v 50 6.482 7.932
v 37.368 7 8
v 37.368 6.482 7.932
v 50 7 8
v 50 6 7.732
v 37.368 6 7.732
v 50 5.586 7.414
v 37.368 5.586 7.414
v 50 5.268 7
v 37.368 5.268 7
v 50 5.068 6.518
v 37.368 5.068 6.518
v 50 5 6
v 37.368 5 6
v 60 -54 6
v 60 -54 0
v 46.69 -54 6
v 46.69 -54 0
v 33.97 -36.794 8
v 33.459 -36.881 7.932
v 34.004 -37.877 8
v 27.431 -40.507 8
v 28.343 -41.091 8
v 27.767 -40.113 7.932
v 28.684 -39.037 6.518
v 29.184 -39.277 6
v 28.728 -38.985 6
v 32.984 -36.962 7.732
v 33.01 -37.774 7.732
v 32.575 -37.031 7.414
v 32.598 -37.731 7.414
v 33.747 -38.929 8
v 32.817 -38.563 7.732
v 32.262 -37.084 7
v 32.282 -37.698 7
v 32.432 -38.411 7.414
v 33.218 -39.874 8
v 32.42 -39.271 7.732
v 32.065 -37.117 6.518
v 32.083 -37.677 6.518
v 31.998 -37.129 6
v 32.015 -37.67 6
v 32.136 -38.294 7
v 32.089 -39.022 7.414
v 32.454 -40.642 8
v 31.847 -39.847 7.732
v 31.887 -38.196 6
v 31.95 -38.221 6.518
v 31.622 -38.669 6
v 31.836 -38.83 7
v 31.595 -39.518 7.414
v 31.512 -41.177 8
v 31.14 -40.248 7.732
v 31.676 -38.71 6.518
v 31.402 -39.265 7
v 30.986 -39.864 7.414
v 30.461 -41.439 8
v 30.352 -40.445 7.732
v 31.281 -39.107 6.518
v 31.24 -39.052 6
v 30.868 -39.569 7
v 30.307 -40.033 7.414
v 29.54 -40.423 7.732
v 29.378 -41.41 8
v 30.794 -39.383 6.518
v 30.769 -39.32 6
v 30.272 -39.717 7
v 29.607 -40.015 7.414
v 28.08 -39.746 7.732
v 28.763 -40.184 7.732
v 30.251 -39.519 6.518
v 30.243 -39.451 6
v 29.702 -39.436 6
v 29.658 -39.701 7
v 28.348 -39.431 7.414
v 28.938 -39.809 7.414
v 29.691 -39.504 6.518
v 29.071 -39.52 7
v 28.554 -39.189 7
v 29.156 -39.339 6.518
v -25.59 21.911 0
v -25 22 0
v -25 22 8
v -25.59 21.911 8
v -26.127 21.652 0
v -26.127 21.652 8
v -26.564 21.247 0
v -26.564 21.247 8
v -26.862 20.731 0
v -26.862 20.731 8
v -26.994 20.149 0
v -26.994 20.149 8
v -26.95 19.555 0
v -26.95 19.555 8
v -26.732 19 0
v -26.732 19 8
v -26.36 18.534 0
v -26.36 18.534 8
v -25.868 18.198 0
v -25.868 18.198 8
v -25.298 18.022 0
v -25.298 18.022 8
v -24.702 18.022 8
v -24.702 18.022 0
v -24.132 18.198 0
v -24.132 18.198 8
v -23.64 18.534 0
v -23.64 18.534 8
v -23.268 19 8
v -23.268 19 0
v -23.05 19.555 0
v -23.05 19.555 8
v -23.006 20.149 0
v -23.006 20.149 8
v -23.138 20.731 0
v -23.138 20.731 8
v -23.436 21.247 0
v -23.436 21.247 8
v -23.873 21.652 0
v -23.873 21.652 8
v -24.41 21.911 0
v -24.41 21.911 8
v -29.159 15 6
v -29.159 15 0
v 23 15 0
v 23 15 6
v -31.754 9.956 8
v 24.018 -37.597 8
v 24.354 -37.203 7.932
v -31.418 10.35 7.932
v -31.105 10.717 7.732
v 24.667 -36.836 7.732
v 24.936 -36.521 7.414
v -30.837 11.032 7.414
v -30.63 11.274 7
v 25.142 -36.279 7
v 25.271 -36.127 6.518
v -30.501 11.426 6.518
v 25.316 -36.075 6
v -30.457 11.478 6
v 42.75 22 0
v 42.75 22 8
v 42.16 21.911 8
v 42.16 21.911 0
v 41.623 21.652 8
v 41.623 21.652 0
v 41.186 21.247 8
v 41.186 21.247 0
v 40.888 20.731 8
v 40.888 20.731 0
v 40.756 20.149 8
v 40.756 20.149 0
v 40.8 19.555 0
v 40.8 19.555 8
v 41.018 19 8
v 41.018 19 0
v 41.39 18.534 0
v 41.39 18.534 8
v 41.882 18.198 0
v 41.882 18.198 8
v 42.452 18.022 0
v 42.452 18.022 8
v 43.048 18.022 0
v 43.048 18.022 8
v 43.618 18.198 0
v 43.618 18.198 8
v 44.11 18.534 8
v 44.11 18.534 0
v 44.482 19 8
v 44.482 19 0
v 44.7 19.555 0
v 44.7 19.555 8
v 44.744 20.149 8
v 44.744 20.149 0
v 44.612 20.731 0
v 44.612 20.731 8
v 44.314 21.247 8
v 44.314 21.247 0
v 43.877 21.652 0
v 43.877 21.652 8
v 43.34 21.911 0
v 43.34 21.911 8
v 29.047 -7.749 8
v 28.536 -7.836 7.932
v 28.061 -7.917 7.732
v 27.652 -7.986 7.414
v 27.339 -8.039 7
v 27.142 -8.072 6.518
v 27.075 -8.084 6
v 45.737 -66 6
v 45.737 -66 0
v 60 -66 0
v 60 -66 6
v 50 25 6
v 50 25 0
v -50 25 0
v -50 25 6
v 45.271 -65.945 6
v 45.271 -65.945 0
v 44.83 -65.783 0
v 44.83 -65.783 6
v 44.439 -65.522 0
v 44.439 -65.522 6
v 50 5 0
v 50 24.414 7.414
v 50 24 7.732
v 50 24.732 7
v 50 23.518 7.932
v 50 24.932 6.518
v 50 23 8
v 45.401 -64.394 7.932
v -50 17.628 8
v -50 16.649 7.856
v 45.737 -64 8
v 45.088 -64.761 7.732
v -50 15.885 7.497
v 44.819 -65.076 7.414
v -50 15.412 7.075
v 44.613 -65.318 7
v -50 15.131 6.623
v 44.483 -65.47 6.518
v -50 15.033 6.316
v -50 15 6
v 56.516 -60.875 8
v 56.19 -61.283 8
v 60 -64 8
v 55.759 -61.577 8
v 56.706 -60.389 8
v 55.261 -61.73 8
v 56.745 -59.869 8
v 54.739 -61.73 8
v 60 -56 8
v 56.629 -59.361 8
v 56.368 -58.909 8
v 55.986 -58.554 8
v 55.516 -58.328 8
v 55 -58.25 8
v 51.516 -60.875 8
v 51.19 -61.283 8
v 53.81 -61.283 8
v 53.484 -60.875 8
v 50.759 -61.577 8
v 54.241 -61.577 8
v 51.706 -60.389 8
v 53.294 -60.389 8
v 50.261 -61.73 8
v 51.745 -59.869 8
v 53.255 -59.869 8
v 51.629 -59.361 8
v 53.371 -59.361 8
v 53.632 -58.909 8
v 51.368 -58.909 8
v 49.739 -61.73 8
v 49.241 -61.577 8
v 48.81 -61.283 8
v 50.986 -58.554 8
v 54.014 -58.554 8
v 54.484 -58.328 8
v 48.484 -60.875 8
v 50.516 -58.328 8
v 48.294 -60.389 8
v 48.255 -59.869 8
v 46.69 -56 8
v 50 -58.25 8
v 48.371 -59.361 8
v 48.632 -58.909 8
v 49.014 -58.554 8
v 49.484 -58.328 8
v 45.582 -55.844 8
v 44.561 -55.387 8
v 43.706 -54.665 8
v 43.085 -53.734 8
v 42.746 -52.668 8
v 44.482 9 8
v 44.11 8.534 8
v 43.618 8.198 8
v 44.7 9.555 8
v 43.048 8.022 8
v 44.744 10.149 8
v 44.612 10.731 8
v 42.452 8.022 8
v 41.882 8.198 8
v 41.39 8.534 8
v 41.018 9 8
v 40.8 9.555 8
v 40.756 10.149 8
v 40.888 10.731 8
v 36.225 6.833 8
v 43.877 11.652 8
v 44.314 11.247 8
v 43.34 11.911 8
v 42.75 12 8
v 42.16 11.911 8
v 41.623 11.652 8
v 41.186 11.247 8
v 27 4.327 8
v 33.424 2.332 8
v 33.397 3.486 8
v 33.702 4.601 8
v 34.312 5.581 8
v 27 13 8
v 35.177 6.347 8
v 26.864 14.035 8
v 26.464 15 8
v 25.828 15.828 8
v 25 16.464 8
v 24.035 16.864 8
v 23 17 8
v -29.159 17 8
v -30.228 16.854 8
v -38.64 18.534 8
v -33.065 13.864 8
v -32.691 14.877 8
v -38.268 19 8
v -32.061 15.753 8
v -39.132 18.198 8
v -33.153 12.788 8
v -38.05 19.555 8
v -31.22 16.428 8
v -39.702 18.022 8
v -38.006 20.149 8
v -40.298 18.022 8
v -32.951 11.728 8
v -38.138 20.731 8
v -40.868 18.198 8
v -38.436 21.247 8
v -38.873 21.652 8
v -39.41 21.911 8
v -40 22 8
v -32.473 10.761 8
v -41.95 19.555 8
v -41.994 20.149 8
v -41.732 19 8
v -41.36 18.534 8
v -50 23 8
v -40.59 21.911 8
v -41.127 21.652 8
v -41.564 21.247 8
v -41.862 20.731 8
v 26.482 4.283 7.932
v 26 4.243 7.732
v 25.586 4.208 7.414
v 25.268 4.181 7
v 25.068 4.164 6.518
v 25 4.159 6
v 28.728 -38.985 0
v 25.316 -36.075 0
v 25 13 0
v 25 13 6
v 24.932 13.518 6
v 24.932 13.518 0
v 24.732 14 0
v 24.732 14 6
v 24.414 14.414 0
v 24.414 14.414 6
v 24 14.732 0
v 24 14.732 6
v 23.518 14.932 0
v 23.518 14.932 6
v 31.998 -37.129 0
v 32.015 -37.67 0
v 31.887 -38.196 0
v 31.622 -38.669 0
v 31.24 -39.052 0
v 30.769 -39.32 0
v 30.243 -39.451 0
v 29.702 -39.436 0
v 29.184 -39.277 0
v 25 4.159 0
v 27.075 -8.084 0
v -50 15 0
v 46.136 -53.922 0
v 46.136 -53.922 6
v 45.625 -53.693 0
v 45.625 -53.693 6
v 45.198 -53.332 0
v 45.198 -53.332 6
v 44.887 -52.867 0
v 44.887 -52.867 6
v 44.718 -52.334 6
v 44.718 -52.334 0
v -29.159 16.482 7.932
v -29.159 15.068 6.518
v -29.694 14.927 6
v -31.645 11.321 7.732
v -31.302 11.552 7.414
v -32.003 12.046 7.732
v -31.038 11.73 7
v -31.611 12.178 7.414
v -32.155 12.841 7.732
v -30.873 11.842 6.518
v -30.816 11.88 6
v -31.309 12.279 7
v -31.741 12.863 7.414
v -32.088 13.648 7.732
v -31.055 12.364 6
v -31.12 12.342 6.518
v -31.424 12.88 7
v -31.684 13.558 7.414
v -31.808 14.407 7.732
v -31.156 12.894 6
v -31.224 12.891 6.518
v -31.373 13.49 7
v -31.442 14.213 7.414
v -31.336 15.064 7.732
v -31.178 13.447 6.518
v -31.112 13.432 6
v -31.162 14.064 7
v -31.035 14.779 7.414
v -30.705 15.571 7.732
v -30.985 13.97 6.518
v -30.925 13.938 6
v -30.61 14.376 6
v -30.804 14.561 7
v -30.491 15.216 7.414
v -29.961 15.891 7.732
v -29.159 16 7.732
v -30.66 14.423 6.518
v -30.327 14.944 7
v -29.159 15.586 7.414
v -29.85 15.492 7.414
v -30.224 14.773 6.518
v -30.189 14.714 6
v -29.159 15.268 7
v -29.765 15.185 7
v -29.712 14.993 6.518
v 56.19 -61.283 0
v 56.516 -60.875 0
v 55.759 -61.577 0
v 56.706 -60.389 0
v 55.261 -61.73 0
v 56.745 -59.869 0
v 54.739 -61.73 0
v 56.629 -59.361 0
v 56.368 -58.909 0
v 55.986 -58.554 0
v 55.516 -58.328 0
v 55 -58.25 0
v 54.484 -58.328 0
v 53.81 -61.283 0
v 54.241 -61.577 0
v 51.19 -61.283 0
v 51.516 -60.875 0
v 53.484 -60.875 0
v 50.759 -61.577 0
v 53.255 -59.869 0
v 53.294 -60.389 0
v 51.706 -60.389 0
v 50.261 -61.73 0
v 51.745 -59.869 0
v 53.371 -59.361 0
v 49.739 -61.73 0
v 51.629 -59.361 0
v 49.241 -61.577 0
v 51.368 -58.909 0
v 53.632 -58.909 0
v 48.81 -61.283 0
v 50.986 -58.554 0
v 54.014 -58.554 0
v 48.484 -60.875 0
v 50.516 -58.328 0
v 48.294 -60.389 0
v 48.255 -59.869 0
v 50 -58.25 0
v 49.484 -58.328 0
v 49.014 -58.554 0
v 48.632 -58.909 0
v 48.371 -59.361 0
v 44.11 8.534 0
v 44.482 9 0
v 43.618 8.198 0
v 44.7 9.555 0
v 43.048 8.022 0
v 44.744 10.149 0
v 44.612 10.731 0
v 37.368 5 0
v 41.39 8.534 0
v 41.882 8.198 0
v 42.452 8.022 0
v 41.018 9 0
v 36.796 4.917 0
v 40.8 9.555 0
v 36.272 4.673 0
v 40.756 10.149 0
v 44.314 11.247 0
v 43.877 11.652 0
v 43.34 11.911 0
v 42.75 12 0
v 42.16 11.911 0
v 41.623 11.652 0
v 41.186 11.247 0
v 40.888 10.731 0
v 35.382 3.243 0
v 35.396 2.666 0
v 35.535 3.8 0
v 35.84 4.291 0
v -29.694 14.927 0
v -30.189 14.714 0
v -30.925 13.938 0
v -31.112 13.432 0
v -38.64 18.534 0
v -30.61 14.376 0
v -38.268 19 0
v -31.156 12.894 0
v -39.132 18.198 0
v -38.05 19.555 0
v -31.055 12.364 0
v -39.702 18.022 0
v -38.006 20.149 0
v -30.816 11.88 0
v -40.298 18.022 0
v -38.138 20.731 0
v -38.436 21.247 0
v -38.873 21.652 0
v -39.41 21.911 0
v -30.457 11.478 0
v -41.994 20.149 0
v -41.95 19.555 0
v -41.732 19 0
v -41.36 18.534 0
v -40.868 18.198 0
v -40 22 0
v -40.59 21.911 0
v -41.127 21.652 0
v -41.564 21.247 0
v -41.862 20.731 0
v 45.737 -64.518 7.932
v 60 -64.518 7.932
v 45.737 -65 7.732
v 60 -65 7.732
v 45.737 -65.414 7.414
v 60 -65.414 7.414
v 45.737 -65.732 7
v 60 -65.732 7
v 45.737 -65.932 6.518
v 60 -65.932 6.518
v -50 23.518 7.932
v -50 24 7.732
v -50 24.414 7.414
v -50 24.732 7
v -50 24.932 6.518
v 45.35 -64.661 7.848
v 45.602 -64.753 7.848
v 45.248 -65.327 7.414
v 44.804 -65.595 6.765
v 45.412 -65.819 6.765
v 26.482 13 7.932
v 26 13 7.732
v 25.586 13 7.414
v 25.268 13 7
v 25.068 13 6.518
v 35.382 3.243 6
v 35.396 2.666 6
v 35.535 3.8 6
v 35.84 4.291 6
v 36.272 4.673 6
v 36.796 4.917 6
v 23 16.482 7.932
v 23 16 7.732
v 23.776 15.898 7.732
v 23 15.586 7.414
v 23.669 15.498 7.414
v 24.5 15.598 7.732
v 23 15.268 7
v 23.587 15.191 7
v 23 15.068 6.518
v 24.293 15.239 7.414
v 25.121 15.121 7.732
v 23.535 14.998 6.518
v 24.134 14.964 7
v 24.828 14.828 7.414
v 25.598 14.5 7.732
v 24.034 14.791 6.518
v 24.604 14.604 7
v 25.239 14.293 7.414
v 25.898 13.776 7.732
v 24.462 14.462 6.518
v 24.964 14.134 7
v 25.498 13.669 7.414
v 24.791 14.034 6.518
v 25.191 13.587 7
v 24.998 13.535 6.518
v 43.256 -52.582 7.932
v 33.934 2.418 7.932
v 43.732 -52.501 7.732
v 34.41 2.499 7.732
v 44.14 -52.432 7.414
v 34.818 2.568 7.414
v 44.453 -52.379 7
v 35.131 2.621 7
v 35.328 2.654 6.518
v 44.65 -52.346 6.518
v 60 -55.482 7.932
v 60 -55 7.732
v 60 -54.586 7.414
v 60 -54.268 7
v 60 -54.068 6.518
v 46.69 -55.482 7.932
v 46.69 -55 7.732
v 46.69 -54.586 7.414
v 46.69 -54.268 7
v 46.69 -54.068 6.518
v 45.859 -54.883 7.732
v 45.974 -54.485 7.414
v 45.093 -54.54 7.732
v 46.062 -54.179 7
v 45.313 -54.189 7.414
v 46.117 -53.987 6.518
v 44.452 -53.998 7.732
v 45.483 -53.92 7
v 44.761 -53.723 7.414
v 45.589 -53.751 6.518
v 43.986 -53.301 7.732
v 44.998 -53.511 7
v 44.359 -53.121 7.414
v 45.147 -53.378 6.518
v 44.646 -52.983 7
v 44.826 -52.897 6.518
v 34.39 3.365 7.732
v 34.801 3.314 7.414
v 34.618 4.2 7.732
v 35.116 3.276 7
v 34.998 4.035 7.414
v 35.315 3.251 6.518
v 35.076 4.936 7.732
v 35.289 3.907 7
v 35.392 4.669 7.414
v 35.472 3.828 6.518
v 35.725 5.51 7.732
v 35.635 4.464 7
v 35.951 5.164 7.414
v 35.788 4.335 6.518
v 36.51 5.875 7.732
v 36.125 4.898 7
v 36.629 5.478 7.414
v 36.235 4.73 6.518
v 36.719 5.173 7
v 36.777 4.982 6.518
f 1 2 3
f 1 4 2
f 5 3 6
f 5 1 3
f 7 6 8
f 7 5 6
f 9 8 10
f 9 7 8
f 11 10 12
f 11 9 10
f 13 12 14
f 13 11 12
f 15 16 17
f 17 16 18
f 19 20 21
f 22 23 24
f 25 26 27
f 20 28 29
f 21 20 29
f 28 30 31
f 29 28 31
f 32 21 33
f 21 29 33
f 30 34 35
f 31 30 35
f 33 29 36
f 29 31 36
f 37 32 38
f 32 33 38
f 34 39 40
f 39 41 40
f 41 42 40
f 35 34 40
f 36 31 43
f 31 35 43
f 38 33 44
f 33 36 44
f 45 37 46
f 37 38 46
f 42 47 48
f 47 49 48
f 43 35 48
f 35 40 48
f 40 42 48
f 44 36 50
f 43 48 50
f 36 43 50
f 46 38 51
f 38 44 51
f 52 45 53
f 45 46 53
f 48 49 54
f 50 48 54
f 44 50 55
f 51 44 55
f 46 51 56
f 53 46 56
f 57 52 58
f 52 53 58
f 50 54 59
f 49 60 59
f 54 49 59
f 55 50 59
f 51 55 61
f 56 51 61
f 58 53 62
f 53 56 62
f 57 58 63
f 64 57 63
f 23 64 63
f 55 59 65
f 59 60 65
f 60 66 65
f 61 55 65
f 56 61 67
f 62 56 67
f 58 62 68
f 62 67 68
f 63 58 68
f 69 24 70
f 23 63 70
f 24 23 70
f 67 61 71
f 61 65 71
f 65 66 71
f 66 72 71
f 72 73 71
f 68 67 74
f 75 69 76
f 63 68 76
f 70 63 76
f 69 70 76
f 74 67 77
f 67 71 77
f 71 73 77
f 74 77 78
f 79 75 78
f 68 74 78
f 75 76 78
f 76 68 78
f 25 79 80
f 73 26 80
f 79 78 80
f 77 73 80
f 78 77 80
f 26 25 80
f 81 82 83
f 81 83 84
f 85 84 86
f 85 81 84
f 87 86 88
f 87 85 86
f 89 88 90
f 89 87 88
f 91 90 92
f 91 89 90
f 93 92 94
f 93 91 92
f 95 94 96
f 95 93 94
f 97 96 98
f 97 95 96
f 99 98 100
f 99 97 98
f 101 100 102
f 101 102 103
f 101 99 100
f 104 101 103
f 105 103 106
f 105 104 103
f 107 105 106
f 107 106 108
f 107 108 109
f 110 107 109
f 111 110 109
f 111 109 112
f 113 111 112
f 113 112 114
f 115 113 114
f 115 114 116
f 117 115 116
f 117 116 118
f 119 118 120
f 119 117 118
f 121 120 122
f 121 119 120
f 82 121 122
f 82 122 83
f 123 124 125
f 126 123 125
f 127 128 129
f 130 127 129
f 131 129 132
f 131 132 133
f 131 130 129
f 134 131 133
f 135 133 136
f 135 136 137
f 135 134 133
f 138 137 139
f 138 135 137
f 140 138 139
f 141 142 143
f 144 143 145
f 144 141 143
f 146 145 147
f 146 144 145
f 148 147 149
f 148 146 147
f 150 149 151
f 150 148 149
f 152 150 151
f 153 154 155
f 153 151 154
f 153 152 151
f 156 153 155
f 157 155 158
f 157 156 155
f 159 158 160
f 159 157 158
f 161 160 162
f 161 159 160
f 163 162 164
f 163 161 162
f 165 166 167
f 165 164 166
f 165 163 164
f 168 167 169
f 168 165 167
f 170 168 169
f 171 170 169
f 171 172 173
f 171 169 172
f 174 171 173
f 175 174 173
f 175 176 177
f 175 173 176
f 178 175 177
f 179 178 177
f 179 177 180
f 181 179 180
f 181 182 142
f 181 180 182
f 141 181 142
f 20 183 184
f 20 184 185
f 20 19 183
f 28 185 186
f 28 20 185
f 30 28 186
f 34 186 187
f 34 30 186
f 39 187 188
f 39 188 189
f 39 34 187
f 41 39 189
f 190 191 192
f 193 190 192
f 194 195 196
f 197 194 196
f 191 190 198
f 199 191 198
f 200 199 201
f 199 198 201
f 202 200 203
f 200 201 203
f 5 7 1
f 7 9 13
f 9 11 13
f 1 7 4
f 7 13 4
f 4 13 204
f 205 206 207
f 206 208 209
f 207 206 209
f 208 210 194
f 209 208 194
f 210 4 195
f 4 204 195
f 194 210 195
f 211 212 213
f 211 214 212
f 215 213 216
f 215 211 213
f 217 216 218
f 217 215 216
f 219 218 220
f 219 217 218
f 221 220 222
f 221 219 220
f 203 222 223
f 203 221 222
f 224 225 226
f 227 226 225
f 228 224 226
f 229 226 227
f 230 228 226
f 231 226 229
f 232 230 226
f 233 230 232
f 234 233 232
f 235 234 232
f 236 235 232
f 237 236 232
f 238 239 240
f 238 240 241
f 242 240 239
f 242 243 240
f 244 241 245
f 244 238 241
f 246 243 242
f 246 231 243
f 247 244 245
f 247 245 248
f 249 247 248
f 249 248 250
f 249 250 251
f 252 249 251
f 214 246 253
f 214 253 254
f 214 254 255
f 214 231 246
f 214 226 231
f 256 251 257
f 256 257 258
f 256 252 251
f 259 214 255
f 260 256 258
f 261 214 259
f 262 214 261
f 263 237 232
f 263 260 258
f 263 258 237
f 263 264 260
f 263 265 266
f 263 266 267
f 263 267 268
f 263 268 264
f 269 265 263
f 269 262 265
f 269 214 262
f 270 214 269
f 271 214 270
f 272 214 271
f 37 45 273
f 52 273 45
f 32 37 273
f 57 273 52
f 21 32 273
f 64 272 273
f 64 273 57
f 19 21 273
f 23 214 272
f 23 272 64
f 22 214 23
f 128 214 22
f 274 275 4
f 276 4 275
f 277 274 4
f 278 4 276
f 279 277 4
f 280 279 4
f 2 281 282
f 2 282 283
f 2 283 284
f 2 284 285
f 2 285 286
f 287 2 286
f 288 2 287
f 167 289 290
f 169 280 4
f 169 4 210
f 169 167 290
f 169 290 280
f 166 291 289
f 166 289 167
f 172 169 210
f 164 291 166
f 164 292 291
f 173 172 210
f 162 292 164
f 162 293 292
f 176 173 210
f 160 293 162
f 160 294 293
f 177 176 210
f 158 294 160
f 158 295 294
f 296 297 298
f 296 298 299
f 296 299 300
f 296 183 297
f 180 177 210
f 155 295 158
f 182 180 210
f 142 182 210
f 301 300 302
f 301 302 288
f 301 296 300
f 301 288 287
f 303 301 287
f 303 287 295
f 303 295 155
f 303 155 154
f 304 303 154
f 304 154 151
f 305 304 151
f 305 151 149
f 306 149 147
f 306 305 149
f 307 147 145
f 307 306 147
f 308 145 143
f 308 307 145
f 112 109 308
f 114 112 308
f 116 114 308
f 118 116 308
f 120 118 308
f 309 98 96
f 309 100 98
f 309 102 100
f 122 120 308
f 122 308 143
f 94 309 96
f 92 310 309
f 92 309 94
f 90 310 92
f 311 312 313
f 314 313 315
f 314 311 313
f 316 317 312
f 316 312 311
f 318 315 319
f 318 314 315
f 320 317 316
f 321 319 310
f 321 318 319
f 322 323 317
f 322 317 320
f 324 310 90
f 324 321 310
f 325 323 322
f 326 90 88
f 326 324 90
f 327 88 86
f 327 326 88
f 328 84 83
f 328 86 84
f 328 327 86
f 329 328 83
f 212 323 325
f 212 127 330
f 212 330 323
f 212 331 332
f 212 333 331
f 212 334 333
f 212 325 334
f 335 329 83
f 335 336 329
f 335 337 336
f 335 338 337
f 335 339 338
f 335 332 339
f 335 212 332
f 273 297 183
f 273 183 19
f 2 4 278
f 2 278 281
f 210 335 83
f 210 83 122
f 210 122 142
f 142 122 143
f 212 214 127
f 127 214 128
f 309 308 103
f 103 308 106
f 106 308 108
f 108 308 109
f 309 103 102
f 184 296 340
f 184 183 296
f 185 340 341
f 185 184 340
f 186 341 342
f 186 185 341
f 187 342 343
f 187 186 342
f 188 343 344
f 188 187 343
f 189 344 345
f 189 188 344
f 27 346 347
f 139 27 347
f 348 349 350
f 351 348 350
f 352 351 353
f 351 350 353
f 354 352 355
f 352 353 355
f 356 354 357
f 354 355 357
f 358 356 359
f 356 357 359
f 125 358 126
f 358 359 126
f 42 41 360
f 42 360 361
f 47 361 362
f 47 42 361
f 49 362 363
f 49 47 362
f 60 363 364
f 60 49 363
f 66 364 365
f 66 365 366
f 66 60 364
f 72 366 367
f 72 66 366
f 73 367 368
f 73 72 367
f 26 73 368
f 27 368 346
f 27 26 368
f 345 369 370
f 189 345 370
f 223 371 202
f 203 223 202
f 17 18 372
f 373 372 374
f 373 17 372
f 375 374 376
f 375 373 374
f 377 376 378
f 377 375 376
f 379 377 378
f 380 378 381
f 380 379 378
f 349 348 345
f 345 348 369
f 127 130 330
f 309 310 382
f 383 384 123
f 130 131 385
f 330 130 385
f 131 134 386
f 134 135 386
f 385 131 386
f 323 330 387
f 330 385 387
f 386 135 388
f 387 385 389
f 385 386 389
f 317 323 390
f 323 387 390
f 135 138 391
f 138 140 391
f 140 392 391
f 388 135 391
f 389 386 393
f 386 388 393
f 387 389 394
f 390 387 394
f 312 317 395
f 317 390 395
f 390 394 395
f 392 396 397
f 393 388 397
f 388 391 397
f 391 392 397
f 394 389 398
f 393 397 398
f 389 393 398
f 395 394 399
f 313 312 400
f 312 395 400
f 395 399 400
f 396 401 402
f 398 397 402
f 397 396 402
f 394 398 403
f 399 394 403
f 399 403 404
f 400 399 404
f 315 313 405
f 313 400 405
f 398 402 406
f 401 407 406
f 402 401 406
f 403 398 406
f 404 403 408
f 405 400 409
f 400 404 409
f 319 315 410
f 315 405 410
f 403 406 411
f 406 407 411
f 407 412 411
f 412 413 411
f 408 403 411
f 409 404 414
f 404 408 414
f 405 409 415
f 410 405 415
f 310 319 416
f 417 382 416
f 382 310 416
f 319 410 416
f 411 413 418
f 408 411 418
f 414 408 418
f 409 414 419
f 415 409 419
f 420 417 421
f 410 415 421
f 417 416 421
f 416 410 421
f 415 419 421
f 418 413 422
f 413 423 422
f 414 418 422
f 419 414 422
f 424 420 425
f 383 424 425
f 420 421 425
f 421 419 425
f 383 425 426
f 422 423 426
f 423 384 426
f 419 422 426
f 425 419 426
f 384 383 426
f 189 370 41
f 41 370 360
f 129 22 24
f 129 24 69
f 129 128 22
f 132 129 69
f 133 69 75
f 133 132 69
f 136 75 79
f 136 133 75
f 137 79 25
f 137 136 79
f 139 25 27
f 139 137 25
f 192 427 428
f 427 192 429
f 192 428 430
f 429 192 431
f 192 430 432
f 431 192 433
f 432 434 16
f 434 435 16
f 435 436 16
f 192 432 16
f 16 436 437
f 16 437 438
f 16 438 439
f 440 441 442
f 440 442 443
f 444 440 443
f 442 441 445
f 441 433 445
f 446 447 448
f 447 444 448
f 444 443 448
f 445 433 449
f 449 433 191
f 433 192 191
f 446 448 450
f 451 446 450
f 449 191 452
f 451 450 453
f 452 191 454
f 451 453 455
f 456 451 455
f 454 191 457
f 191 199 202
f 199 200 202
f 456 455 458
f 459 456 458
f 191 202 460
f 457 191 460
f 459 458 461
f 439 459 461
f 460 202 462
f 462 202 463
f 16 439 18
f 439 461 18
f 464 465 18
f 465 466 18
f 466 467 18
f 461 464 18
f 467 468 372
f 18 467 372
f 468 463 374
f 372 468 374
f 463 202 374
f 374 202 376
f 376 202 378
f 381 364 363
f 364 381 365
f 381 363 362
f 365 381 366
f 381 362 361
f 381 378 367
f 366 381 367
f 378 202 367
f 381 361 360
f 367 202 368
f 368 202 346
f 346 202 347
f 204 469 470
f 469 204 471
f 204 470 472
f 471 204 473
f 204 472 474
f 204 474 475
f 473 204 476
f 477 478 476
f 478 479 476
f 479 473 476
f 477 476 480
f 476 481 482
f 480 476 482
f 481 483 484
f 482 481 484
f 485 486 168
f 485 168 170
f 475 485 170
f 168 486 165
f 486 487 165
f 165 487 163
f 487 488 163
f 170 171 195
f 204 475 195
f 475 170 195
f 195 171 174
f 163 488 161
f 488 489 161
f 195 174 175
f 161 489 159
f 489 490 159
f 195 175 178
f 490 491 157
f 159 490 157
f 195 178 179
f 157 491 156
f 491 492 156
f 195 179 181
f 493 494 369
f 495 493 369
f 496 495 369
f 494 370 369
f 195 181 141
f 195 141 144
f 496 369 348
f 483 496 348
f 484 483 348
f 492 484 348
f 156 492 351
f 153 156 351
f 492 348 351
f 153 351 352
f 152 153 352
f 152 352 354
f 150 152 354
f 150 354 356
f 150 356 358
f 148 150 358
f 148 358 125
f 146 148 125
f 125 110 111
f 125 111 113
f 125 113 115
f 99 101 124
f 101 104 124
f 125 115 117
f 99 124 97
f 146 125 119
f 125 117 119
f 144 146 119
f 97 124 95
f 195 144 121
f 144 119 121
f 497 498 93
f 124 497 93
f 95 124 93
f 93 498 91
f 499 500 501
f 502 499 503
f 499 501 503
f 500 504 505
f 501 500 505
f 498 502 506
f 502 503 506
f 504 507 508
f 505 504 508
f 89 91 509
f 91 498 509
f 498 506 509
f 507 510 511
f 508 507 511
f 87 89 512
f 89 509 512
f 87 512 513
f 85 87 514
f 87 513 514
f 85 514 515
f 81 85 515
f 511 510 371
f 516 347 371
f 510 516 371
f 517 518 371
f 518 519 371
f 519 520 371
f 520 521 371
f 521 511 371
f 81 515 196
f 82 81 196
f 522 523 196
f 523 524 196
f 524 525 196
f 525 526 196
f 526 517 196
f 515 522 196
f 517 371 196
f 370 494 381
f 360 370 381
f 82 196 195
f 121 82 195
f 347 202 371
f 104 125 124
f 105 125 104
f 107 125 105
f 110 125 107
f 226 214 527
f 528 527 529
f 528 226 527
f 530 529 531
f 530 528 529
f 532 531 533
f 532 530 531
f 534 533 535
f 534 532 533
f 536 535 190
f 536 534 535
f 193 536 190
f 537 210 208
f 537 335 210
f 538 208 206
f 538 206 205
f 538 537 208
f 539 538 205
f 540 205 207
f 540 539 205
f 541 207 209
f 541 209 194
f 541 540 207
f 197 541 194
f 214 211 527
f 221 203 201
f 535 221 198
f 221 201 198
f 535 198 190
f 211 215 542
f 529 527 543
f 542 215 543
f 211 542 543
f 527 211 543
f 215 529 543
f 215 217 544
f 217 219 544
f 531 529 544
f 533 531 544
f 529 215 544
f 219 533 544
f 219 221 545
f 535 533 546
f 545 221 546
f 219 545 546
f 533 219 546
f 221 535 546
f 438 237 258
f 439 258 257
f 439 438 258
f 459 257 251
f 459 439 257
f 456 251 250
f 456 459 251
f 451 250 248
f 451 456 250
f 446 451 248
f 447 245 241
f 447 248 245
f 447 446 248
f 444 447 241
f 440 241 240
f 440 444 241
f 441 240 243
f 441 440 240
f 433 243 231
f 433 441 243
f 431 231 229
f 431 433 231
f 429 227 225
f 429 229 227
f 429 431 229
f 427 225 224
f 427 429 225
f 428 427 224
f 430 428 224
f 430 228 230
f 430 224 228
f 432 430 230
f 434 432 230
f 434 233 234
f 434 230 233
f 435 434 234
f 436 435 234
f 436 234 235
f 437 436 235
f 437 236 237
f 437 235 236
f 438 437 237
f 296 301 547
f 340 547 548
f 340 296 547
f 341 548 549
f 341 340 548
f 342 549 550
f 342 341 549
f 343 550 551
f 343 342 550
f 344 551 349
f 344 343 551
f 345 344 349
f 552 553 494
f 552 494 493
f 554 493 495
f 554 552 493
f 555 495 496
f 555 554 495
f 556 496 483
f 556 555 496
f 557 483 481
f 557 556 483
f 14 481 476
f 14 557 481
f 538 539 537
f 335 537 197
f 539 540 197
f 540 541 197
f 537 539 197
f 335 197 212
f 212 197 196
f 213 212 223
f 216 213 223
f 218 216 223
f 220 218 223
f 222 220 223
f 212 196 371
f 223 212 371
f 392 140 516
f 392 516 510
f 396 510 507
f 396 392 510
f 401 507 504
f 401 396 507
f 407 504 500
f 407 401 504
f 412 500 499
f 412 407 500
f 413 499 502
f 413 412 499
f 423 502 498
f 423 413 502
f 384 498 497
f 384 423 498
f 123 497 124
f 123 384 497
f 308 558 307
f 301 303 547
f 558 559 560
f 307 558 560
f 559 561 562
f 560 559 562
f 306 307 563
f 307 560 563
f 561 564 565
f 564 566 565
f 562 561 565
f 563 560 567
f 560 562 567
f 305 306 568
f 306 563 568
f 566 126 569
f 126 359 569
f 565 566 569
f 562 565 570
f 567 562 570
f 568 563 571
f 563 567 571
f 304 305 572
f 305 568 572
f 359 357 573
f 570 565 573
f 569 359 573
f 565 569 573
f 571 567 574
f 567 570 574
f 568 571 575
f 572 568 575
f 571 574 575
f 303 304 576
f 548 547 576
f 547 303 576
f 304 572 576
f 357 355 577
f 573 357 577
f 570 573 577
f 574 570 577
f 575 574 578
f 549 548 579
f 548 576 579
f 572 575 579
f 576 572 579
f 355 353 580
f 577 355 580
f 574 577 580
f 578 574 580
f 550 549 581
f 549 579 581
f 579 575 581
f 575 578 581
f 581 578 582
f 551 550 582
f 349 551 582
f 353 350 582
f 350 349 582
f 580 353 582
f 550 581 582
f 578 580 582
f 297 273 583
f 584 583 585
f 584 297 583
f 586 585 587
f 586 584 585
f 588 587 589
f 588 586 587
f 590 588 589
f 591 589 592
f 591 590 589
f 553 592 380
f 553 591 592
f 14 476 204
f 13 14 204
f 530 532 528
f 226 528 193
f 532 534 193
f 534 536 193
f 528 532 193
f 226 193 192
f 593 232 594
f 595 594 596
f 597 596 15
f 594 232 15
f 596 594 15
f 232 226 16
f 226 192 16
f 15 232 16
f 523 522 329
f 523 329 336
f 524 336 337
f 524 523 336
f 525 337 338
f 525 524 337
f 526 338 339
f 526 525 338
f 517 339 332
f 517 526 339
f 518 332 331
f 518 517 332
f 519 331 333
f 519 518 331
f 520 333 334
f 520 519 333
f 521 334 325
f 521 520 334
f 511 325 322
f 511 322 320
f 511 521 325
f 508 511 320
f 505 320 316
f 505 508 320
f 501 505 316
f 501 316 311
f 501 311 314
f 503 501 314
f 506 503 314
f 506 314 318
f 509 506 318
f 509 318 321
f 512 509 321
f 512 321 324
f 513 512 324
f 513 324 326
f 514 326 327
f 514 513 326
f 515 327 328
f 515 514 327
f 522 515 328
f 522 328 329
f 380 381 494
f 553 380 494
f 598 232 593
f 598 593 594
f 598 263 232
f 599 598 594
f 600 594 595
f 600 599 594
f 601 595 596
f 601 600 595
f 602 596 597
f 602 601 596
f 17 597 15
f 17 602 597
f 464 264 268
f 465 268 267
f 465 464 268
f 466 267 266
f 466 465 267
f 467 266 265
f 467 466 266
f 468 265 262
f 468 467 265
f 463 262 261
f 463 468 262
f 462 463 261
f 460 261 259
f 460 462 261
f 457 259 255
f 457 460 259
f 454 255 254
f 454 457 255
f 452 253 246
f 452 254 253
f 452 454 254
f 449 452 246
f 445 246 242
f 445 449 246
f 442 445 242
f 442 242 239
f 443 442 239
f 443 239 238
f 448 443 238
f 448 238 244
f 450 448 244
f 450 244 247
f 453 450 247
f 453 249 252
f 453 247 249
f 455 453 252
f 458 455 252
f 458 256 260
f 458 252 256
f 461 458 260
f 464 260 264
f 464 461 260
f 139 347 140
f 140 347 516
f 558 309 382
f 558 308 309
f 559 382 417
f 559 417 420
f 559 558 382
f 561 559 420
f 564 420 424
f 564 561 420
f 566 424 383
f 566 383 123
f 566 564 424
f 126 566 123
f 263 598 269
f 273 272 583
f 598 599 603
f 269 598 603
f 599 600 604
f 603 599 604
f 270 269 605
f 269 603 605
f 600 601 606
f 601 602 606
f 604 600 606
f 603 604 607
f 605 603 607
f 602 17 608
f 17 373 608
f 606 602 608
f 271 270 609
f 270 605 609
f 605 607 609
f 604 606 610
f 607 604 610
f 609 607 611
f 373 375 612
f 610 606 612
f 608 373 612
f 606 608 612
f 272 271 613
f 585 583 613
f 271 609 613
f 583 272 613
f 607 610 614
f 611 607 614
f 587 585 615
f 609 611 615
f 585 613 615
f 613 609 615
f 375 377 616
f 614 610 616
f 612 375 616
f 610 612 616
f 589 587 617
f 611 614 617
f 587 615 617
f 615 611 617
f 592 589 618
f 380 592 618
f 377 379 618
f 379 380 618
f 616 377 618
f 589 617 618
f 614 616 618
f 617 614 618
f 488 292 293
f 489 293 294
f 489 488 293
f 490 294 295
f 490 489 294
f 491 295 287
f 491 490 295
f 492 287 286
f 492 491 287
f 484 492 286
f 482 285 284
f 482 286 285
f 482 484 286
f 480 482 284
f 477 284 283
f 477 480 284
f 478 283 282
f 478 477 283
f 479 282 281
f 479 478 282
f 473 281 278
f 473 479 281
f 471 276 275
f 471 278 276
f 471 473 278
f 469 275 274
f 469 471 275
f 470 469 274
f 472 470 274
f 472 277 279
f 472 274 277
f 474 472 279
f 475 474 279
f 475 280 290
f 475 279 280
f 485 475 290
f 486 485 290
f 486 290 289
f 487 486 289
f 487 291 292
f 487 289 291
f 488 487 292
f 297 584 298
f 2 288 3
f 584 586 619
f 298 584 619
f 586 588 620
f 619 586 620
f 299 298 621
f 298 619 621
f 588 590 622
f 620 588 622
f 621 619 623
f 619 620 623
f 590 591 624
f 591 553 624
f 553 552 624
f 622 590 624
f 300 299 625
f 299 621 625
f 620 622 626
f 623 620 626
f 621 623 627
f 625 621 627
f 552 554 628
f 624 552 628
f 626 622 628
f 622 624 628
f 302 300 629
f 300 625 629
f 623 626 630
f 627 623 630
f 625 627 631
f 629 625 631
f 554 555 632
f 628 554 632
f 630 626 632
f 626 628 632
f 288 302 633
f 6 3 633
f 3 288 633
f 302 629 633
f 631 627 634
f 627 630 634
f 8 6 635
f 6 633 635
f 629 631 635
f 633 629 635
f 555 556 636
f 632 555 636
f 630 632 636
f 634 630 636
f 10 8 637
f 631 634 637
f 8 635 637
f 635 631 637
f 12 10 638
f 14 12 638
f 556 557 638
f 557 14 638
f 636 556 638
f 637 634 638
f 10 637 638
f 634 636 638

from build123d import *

# Parameters (mm, degrees)
F0_R      = 2
F1_DEPTH  = 10
F2_R      = 5
F4_R      = 2
F5_DEPTH  = 10
F7_R      = 5
F7_2_R    = 5
F8_R      = 2
F8_2_R    = 2
F10_DEPTH = 25
F11_R     = 1.5
F12_R     = 1.75
F13_DEPTH = 12.5
F15_W     = 9
F15_H     = 20
F16_DEPTH = 10
F17_W     = 6
F17_H     = 20
F18_DEPTH = 25
F21_R     = 2
F22_DEPTH = 30
F24_R     = 2
F25_DEPTH = 12.5
F27_R     = 2
F28_R     = 2
F29_DEPTH = 8
F30_R     = 2
F31_R     = 2
F32_R     = 1.75
F33_DEPTH = 25
F32_R_2   = 2
F37_ANGLE = 90
F40_W     = 60
F40_H     = 10
F40_R     = 2
F41_DEPTH = 8
F43_R     = 1.5


with BuildPart() as f1:
    # F0 (on Top) → F1 (new body)
    with BuildSketch(Plane.XY):
        Polygon((0, 70), (0, 75), (-20, 75), (-30, 75), (-50, -75), (-40, -75), (0, -75), (0, -65), (-38.6666666667, -65), (-30.8, -6), (0, -6), (0, 0), (0, 6), (-29.2, 6), (-21.3333333333, 65), (0, 65), align=None)
        with Locations((-15, 0)):
            Circle(F0_R, mode=Mode.SUBTRACT)
        with Locations((-10.4101235047, 70)):
            Circle(F0_R, mode=Mode.SUBTRACT)
    extrude(amount=F1_DEPTH)

    # F2
    f2_edges = [f1.edges().sort_by_distance(p)[0] for p in [
        (-21.333333, 65, 5),
        (-30.8, -6, 5),
        (-29.2, 6, 5),
        (-38.666667, -65, 5),
        (-50, -75, 5),
    ]]
    fillet(f2_edges, radius=F2_R)

    # F3: F1 across plane


with BuildPart() as f1_1:
    add(f1.part)
    add(f1.part.mirror(Plane.YZ))

    # F4 (on Top) → F5 (join)
    with BuildSketch(Plane.XY):
        with BuildLine():
            Line((0, 80), (0, 75))
            Line((0, 75), (10, 75))
            Line((10, 75), (30, 75))
            Line((30, 75), (13.3333333333, 200))
            Line((13.3333333333, 200), (4.5, 200))
            Line((4.5, 200), (4.5, 192))
            ThreePointArc((4.5, 192), (3.1819805153, 188.8180194847), (0, 187.5))
            Line((0, 187.5), (0, 170.1721444783))
            Line((0, 170.1721444783), (7.3103807362, 170.1721444783))
            Line((7.3103807362, 170.1721444783), (10, 150))
            Line((10, 150), (18.6666666667, 85))
            Line((18.6666666667, 85), (10, 85))
            Line((10, 85), (0, 85))
            Line((0, 85), (0, 80))
        make_face()
        with Locations((10, 80)):
            Circle(F4_R, mode=Mode.SUBTRACT)
    extrude(amount=F5_DEPTH)


with BuildPart() as f6_1:
    # F6: instance of F1
    add(f1_1.part.mirror(Plane.YZ))

    # F7
    f7_edges = [f6_1.edges().sort_by_distance(p)[0] for p in [
        (-7.310381, 170.172144, 5),
        (-18.666667, 85, 5),
        (-13.333333, 200, 5),
    ]]
    fillet(f7_edges, radius=F7_R)

    # F8#2
    f8_2_edges = [f6_1.edges().sort_by_distance(p)[0] for p in [
        (-4.5, 200, 5),
    ]]
    fillet(f8_2_edges, radius=F8_2_R)


with BuildPart() as f1_2:
    add(f1_1.part)

    # F7#2
    f7_2_edges = [f1_2.edges().sort_by_distance(p)[0] for p in [
        (7.310381, 170.172144, 5),
        (18.666667, 85, 5),
        (13.333333, 200, 5),
    ]]
    fillet(f7_2_edges, radius=F7_2_R)

    # F8
    f8_edges = [f1_2.edges().sort_by_distance(p)[0] for p in [
        (4.5, 200, 5),
    ]]
    fillet(f8_edges, radius=F8_R)

    add(f6_1.part)  # F10 merges F6_1
    # F9 (on Top) → F10 (join)
    with BuildSketch(Plane.XY):
        Polygon((0, -6), (0, 0), (0, 6), (-6, 6), (-6, -6), align=None)
    extrude(amount=F10_DEPTH)

    # F11
    f11_edges = [f1_2.edges().sort_by_distance(p)[0] for p in [
        (-6, -6, 17.5),
        (-6, 0, 25),
        (-3, -6, 25),
        (-6, 6, 17.5),
        (-3, 6, 25),
    ]]
    fillet(f11_edges, radius=F11_R)


with BuildPart() as f13:
    # F12 (on Right) → F13 (new body, symmetric)
    with BuildSketch(Plane.YZ):
        with Locations((0, 20)):
            Circle(F12_R)
    extrude(amount=F13_DEPTH, both=True)


with BuildPart() as f13b:
    # F12 (on Right) → F13, piece 2 (new body, symmetric)
    with BuildSketch(Plane.YZ):
        with Locations((0, 15)):
            Circle(F12_R)
    extrude(amount=F13_DEPTH, both=True)


with BuildPart() as f1_3:
    add(f1_2.part)

    # F14: cut F13b, F13
    add(f13b.part, mode=Mode.SUBTRACT)
    add(f13.part, mode=Mode.SUBTRACT)


with BuildPart() as f16:
    # F15 (on Top) → F16 (new body)
    with BuildSketch(Plane.XY):
        Polygon((0, 65), (15, 65), (15, 85), (0, 85), (0, 75), align=None)
        Polygon((-6, 65), (0, 65), (0, 75), (0, 85), (-6, 85), align=None)
        with Locations((-10.5, 75)):
            Rectangle(F15_W, F15_H)
    extrude(amount=F16_DEPTH)


with BuildPart() as f18:
    # F17 (on Top) → F18 (new body)
    with BuildSketch(Plane.XY):
        with Locations((-3, 75)):
            Rectangle(F17_W, F17_H)
    extrude(amount=F18_DEPTH)


with BuildPart() as f16_1:
    add(f16.part)

    # F19: union F18
    add(f18.part)


with BuildPart() as f16_2:
    # F20: moved
    add(f16_1.part.moved(Location((0, 0, 10))))


with BuildPart() as f22:
    # F21 (on Top) → F22 (new body)
    with BuildSketch(Plane.XY):
        with Locations((-10, 80)):
            Circle(F21_R)
    extrude(amount=F22_DEPTH)


with BuildPart() as f22b:
    # F21 (on Top) → F22, piece 2 (new body)
    with BuildSketch(Plane.XY):
        with Locations((10, 80)):
            Circle(F21_R)
    extrude(amount=F22_DEPTH)


with BuildPart() as f22c:
    # F21 (on Top) → F22, piece 3 (new body)
    with BuildSketch(Plane.XY):
        with Locations((-10.4, 70)):
            Circle(F21_R)
    extrude(amount=F22_DEPTH)


with BuildPart() as f22d:
    # F21 (on Top) → F22, piece 4 (new body)
    with BuildSketch(Plane.XY):
        with Locations((10.4, 70)):
            Circle(F21_R)
    extrude(amount=F22_DEPTH)


with BuildPart() as f16_3:
    add(f16_2.part)

    # F23: cut F22d, F22c, F22b, F22
    add(f22d.part, mode=Mode.SUBTRACT)
    add(f22c.part, mode=Mode.SUBTRACT)
    add(f22b.part, mode=Mode.SUBTRACT)
    add(f22.part, mode=Mode.SUBTRACT)


with BuildPart() as f25:
    # F24 (on Right) → F25 (new body, symmetric)
    with BuildSketch(Plane.YZ):
        with Locations((80, 27.2266920656)):
            Circle(F24_R)
    extrude(amount=F25_DEPTH, both=True)


with BuildPart() as f25b:
    # F24 (on Right) → F25, piece 2 (new body, symmetric)
    with BuildSketch(Plane.YZ):
        with Locations((70, 27.2266920656)):
            Circle(F24_R)
    extrude(amount=F25_DEPTH, both=True)


with BuildPart() as f16_4:
    add(f16_3.part)

    # F26: cut F25b, F25
    add(f25b.part, mode=Mode.SUBTRACT)
    add(f25.part, mode=Mode.SUBTRACT)

    # F27
    f27_edges = [f16_4.edges().sort_by_distance(p)[0] for p in [
        (-6, 65, 27.5),
        (-3, 65, 35),
        (-10.5, 65, 20),
        (-15, 65, 15),
        (7.5, 65, 20),
        (15, 65, 15),
        (15, 75, 10),
        (-15, 75, 10),
        (-6, 75, 35),
        (-10.5, 85, 20),
        (-15, 85, 15),
        (-6, 85, 27.5),
        (-3, 85, 35),
        (7.5, 85, 20),
        (15, 85, 15),
    ]]
    fillet(f27_edges, radius=F27_R)


with BuildPart() as f29:
    # F28 (on Right) → F29 (new body)
    with BuildSketch(Plane.YZ):
        Polygon((-6, 10), (0, 10), (6, 10), (6, 25), (65, 35), (65, 20), (75, 20), (85, 20), (85, 35), (85, 120), (75, 120), (-6, 25), align=None)
        Polygon((17.4430621123, 37.0821219176), (23.9249371816, 44.6843210729), (75, 104.5871725266), (75, 45), (64.1585427985, 45), (51.9163602293, 42.9250538018), align=None, mode=Mode.SUBTRACT)
        with Locations((80, 95)):
            Circle(F28_R, mode=Mode.SUBTRACT)
        with Locations((80, 110)):
            Circle(F28_R, mode=Mode.SUBTRACT)
    extrude(amount=F29_DEPTH)

    # F30
    f30_edges = [f29.edges().sort_by_distance(p)[0] for p in [
        (4, 75, 104.587173),
        (4, 75, 45),
        (4, 17.443062, 37.082122),
        (4, 65, 35),
        (4, 6, 25),
        (4, -6, 25),
    ]]
    fillet(f30_edges, radius=F30_R)

    # F31
    f31_edges = [f29.edges().sort_by_distance(p)[0] for p in [
        (8, 46.246648, 70.864105),
        (8, 34.73905, 72.780367),
        (8, 35.165784, 29.943353),
        (8, 85, 70),
    ]]
    fillet(f31_edges, radius=F31_R)


with BuildPart() as f33:
    # F32 (on Right) → F33 (new body)
    with BuildSketch(Plane.YZ):
        with Locations((0, 20)):
            Circle(F32_R)
    extrude(amount=F33_DEPTH)


with BuildPart() as f33b:
    # F32 (on Right) → F33, piece 2 (new body)
    with BuildSketch(Plane.YZ):
        with Locations((0, 15)):
            Circle(F32_R)
    extrude(amount=F33_DEPTH)


with BuildPart() as f33c:
    # F32 (on Right) → F33, piece 3 (new body)
    with BuildSketch(Plane.YZ):
        with Locations((70, 27.25)):
            Circle(F32_R_2)
    extrude(amount=F33_DEPTH)


with BuildPart() as f33d:
    # F32 (on Right) → F33, piece 4 (new body)
    with BuildSketch(Plane.YZ):
        with Locations((80, 27.25)):
            Circle(F32_R_2)
    extrude(amount=F33_DEPTH)


with BuildPart() as f29_1:
    add(f29.part)

    # F34: cut F33d, F33c, F33b, F33
    add(f33d.part, mode=Mode.SUBTRACT)
    add(f33c.part, mode=Mode.SUBTRACT)
    add(f33b.part, mode=Mode.SUBTRACT)
    add(f33.part, mode=Mode.SUBTRACT)


with BuildPart() as f29_2:
    # F37: moved
    add(f29_1.part.rotate(Axis((0, -39.3833108246, 0), (0, -1, 0)), F37_ANGLE))


with BuildPart() as f29_3:
    # F38: moved
    add(f29_2.part.moved(Location((120, -60, 0))))


with BuildPart() as f39_1:
    # F39: instance of F29
    add(f29_3.part.mirror(Plane.YZ))


with BuildPart() as f41:
    # F40 (on Top) → F41 (new body)
    with BuildSketch(Plane.XY):
        with Locations((0, 20)):
            Rectangle(F40_W, F40_H)
        with Locations((-25, 20)):
            Circle(F40_R, mode=Mode.SUBTRACT)
        with Locations((-10, 20)):
            Circle(F40_R, mode=Mode.SUBTRACT)
        with Locations((10, 20)):
            Circle(F40_R, mode=Mode.SUBTRACT)
        with Locations((25, 20)):
            Circle(F40_R, mode=Mode.SUBTRACT)
    extrude(amount=F41_DEPTH)


with BuildPart() as f41_1:
    # F42: moved
    add(f41.part.moved(Location((0, 0, 8))))

    # F43
    f43_edges = [f41_1.edges().sort_by_distance(p)[0] for p in [
        (0, 15, 8),
        (30, 15, 12),
        (30, 25, 12),
        (30, 20, 8),
        (-30, 20, 8),
        (-30, 15, 12),
        (-30, 25, 12),
        (0, 25, 8),
    ]]
    fillet(f43_edges, radius=F43_R)


with BuildPart() as f29_4:
    # F45: moved
    add(f29_3.part.moved(Location((-50, 0, 0))))


solid = f29_4.part
